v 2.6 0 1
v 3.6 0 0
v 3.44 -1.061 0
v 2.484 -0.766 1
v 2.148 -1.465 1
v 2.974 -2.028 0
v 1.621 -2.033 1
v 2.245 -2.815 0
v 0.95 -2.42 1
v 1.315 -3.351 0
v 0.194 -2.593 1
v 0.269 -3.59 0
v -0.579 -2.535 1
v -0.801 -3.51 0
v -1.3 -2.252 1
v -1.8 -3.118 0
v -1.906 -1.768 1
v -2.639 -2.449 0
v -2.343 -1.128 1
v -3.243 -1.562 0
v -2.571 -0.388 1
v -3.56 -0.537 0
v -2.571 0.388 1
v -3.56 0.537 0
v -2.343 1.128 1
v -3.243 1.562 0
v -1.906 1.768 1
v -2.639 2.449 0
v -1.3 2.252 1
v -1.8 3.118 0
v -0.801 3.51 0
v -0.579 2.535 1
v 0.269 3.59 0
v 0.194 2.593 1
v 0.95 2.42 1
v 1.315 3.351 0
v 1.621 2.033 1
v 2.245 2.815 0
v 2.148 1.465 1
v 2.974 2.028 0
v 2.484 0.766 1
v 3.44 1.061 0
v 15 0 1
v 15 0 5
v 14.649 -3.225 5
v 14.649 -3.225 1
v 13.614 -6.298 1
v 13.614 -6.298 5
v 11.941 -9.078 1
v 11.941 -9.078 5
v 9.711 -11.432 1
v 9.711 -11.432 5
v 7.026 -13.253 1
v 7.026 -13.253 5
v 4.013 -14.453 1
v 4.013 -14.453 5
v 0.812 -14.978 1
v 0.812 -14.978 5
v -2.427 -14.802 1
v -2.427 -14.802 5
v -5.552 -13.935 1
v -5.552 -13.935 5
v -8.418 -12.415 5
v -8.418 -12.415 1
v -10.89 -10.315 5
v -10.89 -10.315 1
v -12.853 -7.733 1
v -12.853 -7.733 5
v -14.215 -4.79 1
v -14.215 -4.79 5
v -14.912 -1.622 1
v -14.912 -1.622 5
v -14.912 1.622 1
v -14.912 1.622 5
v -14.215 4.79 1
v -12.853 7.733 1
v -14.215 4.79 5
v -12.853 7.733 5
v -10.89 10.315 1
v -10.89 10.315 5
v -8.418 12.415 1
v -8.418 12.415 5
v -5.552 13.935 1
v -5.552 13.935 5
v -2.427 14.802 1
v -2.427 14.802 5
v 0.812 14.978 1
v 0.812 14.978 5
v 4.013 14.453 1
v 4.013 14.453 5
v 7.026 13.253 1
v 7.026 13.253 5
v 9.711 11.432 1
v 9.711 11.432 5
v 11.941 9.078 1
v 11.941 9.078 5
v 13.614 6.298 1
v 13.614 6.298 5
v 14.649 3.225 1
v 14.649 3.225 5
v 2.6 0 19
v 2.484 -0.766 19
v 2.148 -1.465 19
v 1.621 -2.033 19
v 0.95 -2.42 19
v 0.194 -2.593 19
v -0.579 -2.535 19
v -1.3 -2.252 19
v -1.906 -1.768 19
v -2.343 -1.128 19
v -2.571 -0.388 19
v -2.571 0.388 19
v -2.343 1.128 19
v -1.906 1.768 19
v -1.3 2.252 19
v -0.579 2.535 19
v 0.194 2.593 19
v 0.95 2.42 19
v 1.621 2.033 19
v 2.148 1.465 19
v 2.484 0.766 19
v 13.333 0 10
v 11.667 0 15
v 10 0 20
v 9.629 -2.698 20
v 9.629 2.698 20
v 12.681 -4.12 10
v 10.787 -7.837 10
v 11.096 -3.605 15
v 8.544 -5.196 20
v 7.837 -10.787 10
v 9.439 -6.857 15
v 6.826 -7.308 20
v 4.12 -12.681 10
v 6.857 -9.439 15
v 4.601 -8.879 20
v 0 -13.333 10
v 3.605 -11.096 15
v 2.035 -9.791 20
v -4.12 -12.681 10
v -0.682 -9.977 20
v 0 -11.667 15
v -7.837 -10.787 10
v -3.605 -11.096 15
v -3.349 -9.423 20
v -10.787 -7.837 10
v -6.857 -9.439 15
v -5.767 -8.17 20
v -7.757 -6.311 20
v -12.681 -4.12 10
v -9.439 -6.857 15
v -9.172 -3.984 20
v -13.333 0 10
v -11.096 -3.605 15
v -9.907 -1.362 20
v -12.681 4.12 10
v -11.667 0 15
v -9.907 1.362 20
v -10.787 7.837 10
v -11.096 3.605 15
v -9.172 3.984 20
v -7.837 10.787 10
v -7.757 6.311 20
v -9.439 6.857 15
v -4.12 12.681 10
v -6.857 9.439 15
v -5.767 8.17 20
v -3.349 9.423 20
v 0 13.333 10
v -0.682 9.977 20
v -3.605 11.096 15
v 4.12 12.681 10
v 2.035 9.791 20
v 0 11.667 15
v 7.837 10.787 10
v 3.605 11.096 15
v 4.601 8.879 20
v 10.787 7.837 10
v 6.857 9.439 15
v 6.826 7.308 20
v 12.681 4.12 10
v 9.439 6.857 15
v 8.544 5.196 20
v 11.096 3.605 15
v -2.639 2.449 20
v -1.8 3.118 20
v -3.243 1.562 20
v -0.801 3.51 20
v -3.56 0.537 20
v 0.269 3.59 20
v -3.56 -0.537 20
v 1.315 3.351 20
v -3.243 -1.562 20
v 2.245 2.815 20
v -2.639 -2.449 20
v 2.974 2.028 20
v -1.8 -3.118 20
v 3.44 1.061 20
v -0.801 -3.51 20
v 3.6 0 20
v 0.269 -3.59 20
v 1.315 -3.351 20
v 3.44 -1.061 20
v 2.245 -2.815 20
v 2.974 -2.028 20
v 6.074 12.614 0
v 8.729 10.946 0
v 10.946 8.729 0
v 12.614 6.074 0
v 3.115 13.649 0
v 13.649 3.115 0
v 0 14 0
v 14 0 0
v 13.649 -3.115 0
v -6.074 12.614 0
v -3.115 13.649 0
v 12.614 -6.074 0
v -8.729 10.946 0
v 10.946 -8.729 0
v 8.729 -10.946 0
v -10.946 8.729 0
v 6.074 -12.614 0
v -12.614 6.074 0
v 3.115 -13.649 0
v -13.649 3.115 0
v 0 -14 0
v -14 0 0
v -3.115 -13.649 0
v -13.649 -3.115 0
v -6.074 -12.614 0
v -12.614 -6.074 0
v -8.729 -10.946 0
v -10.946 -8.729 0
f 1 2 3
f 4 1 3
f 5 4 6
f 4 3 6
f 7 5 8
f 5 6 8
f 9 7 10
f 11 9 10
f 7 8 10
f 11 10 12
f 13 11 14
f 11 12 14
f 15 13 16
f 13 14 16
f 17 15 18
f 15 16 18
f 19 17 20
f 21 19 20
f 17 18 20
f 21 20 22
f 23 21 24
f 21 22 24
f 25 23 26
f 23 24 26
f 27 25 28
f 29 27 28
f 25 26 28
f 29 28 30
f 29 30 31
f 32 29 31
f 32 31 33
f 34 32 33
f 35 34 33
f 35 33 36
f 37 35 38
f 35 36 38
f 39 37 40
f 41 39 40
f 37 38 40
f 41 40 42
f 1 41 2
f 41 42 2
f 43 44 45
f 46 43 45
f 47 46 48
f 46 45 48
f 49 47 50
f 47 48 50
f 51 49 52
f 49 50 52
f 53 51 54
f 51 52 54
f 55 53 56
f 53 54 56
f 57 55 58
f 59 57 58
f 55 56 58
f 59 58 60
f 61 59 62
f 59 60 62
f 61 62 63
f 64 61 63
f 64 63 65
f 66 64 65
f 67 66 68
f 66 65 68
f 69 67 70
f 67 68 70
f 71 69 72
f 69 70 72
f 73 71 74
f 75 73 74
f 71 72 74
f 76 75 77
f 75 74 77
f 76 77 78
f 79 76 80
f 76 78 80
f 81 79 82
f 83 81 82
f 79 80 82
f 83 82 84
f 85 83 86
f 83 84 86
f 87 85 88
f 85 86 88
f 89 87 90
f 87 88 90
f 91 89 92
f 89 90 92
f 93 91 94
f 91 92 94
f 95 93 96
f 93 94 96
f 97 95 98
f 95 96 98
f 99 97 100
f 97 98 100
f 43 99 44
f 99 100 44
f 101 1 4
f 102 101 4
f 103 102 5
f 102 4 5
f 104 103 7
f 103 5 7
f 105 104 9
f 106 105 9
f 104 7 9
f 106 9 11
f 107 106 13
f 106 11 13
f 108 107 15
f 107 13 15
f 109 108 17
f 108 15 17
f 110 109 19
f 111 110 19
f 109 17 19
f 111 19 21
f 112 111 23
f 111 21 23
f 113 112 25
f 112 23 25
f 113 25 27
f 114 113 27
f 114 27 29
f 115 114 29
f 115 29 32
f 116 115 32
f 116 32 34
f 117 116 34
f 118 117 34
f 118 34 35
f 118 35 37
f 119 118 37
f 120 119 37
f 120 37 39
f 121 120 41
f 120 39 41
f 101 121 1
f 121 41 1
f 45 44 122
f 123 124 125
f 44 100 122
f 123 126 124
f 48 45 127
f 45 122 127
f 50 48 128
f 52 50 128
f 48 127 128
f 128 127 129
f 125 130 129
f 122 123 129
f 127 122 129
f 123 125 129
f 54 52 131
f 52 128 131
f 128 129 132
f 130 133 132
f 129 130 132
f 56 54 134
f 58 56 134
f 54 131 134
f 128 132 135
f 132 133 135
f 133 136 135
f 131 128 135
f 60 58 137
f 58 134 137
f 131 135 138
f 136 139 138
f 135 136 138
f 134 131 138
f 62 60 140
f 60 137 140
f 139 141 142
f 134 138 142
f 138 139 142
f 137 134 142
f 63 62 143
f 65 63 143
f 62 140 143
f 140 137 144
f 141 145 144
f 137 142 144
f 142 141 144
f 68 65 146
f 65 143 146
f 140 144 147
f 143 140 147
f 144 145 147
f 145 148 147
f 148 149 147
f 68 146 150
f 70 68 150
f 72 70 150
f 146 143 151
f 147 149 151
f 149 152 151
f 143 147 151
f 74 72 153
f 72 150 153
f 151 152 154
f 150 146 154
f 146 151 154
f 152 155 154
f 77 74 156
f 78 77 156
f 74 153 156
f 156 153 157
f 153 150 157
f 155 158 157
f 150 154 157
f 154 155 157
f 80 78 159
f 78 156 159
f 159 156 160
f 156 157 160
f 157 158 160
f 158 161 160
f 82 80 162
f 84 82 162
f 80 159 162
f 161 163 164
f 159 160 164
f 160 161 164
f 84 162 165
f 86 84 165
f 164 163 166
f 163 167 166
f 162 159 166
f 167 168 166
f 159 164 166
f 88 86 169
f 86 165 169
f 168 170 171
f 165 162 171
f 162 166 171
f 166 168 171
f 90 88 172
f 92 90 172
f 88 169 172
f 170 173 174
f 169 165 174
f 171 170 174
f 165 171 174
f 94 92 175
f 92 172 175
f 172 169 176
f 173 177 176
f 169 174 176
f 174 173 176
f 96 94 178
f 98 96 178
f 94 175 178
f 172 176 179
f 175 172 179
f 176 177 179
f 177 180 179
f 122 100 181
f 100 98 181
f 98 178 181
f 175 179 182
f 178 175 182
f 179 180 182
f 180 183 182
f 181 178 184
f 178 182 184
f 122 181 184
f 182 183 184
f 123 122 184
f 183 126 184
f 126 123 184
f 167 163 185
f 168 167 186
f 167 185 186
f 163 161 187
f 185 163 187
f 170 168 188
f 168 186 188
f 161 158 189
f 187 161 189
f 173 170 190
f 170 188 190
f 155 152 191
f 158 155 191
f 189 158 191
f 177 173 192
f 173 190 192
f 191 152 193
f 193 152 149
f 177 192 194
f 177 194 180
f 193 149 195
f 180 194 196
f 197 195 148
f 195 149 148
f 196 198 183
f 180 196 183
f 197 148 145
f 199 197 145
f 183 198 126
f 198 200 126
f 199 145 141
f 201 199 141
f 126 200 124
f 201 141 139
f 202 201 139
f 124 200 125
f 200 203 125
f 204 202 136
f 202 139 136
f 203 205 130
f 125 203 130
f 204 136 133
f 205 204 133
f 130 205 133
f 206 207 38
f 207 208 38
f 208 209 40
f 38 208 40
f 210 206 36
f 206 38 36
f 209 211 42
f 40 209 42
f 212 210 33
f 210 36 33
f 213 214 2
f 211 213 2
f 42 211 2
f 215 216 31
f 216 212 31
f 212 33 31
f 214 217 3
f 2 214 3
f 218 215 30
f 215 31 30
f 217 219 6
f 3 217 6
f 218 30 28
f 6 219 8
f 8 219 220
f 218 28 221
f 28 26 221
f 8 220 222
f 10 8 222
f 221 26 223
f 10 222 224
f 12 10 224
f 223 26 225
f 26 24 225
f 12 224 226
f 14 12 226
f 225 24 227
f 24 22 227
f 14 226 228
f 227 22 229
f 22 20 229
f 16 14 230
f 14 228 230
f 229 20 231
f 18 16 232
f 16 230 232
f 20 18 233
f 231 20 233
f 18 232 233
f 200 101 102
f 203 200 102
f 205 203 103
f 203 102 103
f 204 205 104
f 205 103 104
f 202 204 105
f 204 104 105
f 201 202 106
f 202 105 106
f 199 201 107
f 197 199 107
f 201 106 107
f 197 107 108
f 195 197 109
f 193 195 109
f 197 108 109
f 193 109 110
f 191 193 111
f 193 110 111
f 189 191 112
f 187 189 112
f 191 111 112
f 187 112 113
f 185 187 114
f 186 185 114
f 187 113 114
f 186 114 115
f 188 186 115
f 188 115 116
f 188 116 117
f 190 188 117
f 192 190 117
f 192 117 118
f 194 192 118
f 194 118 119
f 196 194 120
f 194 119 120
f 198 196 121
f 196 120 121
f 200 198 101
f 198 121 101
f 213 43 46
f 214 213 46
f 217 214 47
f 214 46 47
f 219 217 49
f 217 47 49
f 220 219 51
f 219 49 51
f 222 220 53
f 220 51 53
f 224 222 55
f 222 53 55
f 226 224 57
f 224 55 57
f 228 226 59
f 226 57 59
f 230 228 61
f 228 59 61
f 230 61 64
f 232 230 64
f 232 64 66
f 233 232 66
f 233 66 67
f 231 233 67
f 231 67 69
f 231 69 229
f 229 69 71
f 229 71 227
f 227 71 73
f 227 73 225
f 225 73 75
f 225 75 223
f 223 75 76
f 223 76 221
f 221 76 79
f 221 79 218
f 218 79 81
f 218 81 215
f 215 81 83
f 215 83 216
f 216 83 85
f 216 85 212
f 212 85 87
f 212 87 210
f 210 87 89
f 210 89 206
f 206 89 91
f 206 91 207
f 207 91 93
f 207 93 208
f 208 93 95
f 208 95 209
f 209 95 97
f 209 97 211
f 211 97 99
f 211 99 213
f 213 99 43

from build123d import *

# Parameters (mm, degrees)
F2_SIZE = 1


with BuildPart() as f1:
    # F0 (on Front) → F1 (revolve)
    with BuildSketch(Plane.XZ):
        Polygon((10, 20), (2.6, 20), (2.6, 0), (15, 0), (15, 5), align=None)
    revolve(axis=Axis((0, 0, 10), (0, 0, -1)))

    # F2
    f2_edges = [f1.edges().sort_by_distance(p)[0] for p in [
        (-2.6, 0, 20),
        (-2.6, 0, 0),
        (-15, 0, 0),
    ]]
    chamfer(f2_edges, length=F2_SIZE)


solid = f1.part
